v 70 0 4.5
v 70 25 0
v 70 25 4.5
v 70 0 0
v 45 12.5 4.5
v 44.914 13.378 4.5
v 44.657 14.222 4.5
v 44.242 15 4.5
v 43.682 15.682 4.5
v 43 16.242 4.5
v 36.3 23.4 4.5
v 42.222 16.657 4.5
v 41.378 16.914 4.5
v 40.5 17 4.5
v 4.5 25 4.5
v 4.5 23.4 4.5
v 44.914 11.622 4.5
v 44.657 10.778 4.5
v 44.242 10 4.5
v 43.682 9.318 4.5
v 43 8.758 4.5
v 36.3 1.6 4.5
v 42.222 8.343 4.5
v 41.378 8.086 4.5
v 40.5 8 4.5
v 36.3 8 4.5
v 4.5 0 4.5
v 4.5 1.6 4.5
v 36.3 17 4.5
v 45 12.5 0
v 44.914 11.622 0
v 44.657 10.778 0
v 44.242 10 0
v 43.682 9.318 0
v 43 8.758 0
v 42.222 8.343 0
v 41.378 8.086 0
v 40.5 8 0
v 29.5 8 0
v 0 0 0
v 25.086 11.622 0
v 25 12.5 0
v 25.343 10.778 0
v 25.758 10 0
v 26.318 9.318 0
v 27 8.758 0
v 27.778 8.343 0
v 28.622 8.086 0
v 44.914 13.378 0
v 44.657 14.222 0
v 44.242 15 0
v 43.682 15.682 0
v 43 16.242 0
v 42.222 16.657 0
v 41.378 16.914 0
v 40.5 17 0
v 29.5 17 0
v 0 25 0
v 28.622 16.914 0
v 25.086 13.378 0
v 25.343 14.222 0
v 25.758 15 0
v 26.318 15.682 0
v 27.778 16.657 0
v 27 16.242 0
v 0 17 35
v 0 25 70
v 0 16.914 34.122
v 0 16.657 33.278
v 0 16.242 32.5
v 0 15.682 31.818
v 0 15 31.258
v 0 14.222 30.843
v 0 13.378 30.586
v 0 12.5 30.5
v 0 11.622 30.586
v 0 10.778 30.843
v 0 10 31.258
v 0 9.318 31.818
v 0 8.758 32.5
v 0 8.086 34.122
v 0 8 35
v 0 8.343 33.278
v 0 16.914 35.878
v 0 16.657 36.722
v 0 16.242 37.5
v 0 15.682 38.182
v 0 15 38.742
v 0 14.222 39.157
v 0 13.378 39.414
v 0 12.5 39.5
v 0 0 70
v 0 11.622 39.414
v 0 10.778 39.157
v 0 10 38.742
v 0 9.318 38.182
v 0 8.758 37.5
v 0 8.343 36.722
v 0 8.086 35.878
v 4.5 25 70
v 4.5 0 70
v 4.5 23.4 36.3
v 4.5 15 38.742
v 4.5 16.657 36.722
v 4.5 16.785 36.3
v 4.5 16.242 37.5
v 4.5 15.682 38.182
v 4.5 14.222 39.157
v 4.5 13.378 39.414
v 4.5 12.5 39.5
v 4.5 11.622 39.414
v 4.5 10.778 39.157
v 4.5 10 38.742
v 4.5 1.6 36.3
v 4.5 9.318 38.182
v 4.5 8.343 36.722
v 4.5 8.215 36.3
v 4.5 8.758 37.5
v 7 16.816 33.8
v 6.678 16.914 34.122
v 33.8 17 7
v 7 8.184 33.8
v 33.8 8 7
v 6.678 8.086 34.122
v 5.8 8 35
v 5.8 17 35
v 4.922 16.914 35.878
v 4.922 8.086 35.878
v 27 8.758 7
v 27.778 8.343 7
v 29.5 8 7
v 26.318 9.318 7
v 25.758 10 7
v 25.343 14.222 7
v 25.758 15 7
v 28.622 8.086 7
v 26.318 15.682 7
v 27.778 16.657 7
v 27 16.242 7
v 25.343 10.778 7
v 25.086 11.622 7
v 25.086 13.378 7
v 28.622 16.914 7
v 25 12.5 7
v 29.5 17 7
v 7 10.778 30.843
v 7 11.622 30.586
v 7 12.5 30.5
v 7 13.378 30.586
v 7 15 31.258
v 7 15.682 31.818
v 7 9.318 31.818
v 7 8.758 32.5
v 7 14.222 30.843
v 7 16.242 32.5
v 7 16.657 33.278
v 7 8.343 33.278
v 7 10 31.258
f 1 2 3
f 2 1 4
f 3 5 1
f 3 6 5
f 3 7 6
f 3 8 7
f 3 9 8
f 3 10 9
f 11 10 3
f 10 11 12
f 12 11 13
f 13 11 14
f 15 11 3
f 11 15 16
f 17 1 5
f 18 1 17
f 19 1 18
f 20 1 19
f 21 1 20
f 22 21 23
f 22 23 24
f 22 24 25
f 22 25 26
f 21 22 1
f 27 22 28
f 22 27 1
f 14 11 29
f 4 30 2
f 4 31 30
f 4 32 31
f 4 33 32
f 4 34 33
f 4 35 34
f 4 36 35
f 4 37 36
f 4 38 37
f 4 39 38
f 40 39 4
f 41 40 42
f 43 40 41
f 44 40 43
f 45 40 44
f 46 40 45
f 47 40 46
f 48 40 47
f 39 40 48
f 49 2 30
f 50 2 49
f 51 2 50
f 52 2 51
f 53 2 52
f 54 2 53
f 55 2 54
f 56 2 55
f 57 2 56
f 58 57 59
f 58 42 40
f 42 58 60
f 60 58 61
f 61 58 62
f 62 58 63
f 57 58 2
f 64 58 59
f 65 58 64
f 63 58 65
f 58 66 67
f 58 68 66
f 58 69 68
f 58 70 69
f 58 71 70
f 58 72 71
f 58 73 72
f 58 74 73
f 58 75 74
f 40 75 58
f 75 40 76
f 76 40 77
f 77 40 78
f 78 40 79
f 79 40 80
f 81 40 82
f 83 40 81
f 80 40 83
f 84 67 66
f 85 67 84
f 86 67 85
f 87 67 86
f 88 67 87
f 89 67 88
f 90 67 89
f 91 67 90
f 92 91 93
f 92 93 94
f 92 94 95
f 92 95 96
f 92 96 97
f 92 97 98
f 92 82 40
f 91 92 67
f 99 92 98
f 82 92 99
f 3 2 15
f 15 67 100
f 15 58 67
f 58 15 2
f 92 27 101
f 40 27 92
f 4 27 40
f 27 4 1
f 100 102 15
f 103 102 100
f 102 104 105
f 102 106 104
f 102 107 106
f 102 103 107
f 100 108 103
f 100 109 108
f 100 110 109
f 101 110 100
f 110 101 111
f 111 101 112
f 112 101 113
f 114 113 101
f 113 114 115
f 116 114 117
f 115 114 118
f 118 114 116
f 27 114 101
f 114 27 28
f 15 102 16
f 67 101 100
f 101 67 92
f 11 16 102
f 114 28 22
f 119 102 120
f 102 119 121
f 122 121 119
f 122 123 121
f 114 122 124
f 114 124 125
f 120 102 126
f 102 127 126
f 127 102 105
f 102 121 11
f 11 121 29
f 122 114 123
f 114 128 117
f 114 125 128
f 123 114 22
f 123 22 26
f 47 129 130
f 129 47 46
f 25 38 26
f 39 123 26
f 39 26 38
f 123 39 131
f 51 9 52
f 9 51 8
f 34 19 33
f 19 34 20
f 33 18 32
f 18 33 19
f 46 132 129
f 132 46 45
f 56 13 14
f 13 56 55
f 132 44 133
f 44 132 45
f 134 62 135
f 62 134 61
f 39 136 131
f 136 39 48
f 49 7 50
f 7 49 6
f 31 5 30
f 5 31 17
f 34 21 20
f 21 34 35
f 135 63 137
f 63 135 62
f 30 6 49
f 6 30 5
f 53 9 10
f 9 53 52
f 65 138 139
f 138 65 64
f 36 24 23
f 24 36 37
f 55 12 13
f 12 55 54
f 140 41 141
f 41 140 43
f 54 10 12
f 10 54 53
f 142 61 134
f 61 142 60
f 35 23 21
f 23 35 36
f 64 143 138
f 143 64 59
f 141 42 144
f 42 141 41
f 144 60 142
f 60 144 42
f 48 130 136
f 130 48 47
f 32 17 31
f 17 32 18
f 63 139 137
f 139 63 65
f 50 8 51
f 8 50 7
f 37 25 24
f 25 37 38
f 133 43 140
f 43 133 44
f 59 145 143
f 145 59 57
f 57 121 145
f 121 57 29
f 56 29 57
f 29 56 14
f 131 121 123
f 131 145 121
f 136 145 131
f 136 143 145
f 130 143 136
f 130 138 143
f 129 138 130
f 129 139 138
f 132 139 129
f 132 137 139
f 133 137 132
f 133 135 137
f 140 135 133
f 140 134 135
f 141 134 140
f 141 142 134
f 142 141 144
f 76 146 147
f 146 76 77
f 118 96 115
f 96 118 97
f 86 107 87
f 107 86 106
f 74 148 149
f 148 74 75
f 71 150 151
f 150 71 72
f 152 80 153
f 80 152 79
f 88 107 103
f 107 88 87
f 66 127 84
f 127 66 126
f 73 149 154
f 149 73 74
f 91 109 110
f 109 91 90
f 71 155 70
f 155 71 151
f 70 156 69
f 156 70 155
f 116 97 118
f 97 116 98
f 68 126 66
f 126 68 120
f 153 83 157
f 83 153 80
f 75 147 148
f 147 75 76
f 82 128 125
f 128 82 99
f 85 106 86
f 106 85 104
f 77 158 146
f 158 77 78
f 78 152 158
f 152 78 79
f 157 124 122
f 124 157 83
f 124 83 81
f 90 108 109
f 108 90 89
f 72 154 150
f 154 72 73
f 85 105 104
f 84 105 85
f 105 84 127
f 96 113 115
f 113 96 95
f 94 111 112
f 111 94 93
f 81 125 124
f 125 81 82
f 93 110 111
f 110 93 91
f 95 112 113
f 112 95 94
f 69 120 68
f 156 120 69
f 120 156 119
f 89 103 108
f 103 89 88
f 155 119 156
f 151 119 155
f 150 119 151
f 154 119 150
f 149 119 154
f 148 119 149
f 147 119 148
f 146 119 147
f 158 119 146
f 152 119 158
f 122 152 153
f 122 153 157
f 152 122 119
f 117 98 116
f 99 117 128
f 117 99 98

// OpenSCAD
$fn = 32;

// ----------------------------------------------------------------------
// L-bracket: 70 x 25 x 70 mm
// ----------------------------------------------------------------------

// --- parameters (mm) ---
horiz_len = 70;           // horizontal leg, X
vert_len = 70;            // vertical leg, Z
profile_w = 25;           // bracket depth, Y
plate_t = 4.5;            // plate thickness
hole_d = 9;               // clearance for M8
slot_l = 20;              // adjustment slot length
rib_leg = 39.2;           // gusset leg
rib_sink = 1.6;           // gusset overlap into the plates

module hole_z(px, py) {
  translate([px, py, -2.5]) cylinder(h = plate_t + 5, d = hole_d);
}
module hole_x(pz, py) {
  translate([-2.5, py, pz]) rotate([0, 90, 0]) cylinder(h = plate_t + 5, d = hole_d);
}
module adjust_slot(px, py) {
  hull() {
    translate([px - (slot_l - hole_d) / 2, py, -2.5]) cylinder(h = plate_t + 5, d = hole_d);
    translate([px + (slot_l - hole_d) / 2, py, -2.5]) cylinder(h = plate_t + 5, d = hole_d);
  }
}
module gusset() {
  translate([0, profile_w - rib_sink, 0])
    rotate([90, 0, 0])
      linear_extrude(height = profile_w - 2 * rib_sink)
        polygon(points = [[rib_sink, rib_sink], [rib_leg, rib_sink], [rib_sink, rib_leg]]);
}

difference() {
  union() {
    /* horizontal leg */
    cube([horiz_len, profile_w, plate_t]);
    /* vertical leg, overlapping the corner block */
    cube([plate_t, profile_w, vert_len]);
    gusset();
  }
  adjust_slot(35, 12.5);
  hole_x(35, 12.5);
}
